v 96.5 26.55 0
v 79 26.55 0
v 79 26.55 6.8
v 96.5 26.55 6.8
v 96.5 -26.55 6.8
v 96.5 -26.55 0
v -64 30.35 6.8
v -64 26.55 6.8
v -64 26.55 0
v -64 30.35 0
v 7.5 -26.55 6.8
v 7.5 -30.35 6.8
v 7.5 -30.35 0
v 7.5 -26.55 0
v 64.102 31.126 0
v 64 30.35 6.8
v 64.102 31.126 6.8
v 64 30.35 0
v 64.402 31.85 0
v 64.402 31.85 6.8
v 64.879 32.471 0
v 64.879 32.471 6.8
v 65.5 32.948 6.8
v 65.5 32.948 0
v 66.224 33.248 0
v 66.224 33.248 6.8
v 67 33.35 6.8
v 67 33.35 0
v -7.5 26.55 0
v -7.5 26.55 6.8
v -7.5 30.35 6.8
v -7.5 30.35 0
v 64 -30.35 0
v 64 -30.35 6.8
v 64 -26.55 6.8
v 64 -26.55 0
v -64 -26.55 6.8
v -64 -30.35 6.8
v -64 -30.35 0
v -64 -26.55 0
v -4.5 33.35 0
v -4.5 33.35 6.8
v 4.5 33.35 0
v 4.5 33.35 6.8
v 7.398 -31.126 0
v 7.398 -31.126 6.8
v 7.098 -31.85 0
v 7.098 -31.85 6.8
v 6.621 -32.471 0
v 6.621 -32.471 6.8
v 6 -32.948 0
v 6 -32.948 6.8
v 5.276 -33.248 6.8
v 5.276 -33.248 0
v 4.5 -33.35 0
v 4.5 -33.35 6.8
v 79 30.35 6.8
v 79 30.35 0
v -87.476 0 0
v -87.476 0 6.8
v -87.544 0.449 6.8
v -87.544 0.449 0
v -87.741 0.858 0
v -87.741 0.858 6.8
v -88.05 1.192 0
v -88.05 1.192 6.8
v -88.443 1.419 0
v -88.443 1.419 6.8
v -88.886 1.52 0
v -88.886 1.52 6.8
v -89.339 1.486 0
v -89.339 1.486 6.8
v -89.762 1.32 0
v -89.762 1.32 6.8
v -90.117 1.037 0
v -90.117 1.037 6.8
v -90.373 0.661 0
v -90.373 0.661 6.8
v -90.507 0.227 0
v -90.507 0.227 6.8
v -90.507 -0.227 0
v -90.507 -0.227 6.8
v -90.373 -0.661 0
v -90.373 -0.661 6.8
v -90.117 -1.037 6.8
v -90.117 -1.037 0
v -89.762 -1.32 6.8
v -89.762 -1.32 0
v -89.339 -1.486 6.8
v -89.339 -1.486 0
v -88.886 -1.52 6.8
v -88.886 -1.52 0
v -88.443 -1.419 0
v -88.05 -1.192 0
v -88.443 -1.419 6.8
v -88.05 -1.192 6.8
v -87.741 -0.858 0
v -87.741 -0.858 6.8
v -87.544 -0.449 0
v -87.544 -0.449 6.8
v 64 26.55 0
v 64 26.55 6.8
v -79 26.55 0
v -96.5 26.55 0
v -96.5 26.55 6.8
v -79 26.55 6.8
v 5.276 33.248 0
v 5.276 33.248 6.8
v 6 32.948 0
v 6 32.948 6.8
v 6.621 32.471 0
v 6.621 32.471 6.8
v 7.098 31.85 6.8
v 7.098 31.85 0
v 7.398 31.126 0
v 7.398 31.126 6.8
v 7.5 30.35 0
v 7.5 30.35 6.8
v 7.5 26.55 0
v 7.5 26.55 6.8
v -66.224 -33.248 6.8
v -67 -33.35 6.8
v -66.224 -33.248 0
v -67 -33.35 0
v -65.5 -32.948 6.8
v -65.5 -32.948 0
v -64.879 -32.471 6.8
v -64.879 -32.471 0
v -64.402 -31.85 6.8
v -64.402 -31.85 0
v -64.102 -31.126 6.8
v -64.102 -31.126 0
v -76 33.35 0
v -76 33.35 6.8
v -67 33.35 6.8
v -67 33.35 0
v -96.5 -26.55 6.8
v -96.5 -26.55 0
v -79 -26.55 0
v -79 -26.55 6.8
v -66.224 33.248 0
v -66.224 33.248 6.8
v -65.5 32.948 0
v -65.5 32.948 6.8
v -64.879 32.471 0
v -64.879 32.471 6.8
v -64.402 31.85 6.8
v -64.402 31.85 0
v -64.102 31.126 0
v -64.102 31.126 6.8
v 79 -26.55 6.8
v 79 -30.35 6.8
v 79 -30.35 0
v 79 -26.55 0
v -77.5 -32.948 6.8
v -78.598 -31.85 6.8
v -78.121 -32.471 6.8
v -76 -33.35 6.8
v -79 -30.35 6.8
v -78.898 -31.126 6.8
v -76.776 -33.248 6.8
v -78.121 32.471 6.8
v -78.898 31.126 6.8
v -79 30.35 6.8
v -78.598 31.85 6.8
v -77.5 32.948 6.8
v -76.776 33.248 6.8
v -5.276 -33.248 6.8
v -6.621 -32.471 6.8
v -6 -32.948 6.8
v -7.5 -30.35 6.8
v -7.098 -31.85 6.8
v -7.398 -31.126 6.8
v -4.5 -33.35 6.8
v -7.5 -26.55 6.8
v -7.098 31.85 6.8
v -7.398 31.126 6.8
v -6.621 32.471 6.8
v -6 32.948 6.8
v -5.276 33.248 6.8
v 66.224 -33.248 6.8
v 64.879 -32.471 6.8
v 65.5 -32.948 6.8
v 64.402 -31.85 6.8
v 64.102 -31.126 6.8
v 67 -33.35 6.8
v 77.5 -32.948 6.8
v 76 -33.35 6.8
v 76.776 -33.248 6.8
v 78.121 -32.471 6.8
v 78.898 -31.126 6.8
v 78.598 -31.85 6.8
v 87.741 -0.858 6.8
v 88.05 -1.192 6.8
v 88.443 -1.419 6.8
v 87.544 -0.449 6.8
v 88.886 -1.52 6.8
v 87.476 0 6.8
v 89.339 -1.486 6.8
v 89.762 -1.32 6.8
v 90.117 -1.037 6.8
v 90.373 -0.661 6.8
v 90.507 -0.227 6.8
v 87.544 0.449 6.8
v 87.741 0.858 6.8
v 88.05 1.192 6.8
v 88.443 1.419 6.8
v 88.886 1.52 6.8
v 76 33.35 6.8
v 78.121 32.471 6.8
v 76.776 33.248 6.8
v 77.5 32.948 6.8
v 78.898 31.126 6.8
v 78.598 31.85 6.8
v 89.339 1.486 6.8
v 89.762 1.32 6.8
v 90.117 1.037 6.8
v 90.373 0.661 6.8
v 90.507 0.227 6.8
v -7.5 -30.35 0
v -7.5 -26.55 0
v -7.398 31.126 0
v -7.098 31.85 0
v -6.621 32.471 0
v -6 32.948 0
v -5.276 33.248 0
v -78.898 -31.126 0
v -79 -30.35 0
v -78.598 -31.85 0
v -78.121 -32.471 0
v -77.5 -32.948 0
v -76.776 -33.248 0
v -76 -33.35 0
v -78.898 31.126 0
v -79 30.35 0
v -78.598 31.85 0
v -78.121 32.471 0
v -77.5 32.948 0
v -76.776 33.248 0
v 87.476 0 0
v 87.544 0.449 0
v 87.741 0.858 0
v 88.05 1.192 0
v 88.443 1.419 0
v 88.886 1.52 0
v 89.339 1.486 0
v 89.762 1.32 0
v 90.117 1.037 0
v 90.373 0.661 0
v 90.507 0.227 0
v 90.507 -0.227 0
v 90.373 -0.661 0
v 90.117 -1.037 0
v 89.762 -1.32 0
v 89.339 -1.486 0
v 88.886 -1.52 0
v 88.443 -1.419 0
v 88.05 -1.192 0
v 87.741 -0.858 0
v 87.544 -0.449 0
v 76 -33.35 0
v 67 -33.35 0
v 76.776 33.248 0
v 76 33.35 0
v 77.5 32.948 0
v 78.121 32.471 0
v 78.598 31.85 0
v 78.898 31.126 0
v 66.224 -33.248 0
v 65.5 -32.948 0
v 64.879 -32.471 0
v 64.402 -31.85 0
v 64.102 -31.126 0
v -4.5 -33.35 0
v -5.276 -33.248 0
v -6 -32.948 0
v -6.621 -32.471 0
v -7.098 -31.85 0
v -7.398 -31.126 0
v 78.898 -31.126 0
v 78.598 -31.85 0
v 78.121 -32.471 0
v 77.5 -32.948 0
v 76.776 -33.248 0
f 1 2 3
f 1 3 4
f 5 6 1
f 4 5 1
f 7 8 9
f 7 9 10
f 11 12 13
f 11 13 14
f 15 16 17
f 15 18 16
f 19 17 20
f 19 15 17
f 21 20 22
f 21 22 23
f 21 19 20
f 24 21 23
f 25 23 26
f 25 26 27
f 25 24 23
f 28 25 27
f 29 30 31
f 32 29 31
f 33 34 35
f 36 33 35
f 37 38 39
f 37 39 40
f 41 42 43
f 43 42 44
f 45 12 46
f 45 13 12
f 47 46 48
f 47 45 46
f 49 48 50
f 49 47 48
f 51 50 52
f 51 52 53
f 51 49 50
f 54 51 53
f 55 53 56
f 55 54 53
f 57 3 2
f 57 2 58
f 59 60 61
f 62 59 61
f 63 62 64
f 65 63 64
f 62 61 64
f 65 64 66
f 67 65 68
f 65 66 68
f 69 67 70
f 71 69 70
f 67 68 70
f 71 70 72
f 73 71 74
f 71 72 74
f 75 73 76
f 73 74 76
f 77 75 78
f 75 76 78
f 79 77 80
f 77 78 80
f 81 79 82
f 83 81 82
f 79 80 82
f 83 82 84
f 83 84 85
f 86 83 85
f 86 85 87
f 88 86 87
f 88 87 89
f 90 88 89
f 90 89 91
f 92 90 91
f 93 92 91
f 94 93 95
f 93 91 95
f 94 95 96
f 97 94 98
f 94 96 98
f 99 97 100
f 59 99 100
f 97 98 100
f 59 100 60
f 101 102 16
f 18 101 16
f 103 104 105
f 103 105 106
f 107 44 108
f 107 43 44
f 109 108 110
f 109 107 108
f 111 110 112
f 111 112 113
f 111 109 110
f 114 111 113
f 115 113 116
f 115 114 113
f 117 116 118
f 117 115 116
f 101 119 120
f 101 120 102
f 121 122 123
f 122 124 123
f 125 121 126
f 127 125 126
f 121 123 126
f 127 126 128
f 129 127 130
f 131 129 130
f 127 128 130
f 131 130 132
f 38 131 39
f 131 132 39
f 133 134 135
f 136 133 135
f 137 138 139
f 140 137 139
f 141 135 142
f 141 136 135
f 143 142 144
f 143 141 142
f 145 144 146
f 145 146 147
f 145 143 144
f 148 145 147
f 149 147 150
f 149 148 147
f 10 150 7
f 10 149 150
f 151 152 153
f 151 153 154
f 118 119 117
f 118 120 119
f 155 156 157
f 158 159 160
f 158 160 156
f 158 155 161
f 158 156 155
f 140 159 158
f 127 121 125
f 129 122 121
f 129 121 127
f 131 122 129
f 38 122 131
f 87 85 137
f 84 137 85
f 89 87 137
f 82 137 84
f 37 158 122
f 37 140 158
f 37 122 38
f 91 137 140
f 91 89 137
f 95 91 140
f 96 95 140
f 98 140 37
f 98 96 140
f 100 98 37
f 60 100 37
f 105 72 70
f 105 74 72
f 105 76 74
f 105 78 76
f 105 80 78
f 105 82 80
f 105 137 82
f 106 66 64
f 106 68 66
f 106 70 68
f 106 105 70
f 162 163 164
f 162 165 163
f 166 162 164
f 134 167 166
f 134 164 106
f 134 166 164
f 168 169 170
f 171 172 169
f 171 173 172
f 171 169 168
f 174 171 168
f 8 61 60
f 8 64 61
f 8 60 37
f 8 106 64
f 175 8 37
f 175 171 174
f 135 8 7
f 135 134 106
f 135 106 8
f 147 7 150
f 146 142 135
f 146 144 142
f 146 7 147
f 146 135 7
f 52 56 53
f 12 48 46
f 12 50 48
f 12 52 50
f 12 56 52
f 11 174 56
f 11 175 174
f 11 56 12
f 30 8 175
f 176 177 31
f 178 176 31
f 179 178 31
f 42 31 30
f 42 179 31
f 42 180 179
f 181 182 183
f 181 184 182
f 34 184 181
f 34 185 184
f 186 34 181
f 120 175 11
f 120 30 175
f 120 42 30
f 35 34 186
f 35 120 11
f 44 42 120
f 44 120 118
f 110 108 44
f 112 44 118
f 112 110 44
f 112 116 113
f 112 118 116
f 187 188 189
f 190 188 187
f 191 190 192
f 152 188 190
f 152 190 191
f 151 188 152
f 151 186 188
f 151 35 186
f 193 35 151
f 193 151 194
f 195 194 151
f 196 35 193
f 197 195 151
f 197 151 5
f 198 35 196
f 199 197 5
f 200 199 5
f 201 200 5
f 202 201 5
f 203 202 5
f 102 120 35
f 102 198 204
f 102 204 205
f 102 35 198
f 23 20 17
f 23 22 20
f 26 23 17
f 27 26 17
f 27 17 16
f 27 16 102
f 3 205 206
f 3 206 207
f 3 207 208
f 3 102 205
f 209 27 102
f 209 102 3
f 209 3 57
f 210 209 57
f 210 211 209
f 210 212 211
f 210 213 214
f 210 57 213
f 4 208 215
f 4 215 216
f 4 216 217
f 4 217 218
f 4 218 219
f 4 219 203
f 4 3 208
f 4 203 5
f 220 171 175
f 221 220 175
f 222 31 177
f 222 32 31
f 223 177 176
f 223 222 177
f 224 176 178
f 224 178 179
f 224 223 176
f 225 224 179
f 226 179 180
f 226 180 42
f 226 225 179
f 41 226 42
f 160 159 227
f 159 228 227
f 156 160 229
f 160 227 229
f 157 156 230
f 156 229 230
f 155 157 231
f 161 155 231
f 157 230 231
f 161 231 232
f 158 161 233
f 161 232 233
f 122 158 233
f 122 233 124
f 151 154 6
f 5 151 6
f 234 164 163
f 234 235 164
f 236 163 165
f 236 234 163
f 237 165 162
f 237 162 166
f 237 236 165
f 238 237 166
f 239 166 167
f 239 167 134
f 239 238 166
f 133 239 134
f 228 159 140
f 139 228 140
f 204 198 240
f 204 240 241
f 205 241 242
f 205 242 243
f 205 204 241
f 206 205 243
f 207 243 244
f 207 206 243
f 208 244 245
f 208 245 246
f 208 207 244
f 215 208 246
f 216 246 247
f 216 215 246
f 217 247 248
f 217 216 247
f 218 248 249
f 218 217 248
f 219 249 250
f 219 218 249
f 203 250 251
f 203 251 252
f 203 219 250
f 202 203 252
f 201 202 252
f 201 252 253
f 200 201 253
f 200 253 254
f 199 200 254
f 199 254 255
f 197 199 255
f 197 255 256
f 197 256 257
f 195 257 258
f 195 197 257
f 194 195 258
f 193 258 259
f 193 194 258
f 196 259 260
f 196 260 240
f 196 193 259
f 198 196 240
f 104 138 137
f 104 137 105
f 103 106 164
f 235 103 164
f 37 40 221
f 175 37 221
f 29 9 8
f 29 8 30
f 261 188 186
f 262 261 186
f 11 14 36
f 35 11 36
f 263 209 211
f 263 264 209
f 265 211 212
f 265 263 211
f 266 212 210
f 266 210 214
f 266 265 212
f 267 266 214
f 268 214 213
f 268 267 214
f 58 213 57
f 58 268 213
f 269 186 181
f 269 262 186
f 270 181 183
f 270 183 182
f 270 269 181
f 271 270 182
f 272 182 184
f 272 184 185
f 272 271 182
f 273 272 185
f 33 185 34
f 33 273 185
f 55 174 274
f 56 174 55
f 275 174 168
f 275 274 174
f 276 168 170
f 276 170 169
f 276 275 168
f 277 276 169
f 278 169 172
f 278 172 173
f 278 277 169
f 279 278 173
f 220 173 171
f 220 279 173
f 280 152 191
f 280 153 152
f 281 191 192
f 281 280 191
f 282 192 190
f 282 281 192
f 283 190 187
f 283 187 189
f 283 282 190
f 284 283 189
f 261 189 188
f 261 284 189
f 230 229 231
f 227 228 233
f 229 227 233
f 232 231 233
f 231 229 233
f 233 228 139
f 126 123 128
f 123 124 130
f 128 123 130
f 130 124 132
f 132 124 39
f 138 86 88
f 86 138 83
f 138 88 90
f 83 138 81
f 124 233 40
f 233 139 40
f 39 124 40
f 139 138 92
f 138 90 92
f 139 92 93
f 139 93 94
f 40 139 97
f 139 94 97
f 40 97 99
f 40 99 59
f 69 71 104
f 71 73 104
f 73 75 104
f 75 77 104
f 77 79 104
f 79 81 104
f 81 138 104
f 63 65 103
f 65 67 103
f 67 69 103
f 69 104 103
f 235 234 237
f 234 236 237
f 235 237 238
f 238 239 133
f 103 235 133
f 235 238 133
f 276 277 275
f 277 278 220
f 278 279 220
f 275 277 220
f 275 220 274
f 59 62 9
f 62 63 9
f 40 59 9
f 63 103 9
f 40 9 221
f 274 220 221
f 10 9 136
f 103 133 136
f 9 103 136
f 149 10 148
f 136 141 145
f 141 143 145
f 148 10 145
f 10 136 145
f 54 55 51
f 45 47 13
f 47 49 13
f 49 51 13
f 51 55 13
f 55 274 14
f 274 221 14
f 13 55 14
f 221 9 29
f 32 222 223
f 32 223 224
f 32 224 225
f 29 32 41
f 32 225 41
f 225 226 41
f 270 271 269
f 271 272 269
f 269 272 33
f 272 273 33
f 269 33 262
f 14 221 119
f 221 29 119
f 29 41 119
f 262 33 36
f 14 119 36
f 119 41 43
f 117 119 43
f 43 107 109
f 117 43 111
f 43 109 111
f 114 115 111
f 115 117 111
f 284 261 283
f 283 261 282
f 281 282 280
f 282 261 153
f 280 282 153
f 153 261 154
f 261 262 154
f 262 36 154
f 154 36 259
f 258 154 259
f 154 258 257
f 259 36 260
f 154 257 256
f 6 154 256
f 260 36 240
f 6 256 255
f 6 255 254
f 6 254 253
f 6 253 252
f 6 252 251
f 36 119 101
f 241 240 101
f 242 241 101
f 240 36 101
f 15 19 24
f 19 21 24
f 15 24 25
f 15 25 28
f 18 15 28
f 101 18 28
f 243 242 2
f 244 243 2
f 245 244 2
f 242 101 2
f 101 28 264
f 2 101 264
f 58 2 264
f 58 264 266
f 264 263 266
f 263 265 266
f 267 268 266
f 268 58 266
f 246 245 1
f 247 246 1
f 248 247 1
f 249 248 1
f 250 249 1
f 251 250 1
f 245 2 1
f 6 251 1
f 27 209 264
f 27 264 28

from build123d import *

# Parameters (mm, degrees)
SKETCH1_W            = 193
SKETCH1_H            = 53.1
BOSS_EXTRUDE1_DEPTH  = 6.8
SKETCH2_W            = 15
SKETCH2_H            = 6.8
BOSS_EXTRUDE2_DEPTH  = 6.8
SKETCH3_R            = 1.524
CUT_EXTRUDE1_DEPTH   = 6.8
FILLET1_R            = 3
FILLET1_OF_MIRROR1_R = 3


with BuildPart() as part:
    # Sketch1 → Boss-Extrude1 (new body)
    with BuildSketch(Plane.XY):
        Rectangle(SKETCH1_W, SKETCH1_H)
    extrude(amount=BOSS_EXTRUDE1_DEPTH)

    # Sketch2 → Boss-Extrude2 (add)
    with BuildSketch(Plane.XY.offset(6.8)):
        with Locations((0, 29.95)):
            Rectangle(SKETCH2_W, SKETCH2_H)
        with Locations((-71.5, 29.95)):
            Rectangle(SKETCH2_W, SKETCH2_H)
        with Locations((-71.5, -29.95)):
            Rectangle(SKETCH2_W, SKETCH2_H)
        with Locations((0, -29.95)):
            Rectangle(SKETCH2_W, SKETCH2_H)
    boss_extrude2 = extrude(amount=-BOSS_EXTRUDE2_DEPTH)

    # Sketch3 → Cut-Extrude1 (cut)
    with BuildSketch(Plane.XY.offset(6.8)):
        with Locations((-89, 0)):
            Circle(SKETCH3_R)
    cut_extrude1 = extrude(amount=-CUT_EXTRUDE1_DEPTH, mode=Mode.SUBTRACT)

    # Fillet1
    fillet1_edges = [part.edges().sort_by_distance(p)[0] for p in [
        (7.5, 33.35, 3.4),
        (-7.5, 33.35, 3.4),
        (-64, 33.35, 3.4),
        (-79, 33.35, 3.4),
        (7.5, -33.35, 3.4),
        (-7.5, -33.35, 3.4),
        (-64, -33.35, 3.4),
        (-79, -33.35, 3.4),
    ]]
    fillet(fillet1_edges, radius=FILLET1_R)

    # Mirror1: Boss-Extrude2, Cut-Extrude1 across plane
    add(boss_extrude2.mirror(Plane(origin=(0, 0, 0), x_dir=(0, 0, 1), z_dir=(1, 0, 0))))
    add(cut_extrude1.mirror(Plane(origin=(0, 0, 0), x_dir=(0, 0, 1), z_dir=(1, 0, 0))), mode=Mode.SUBTRACT)

    # Fillet1 of Mirror1
    fillet1_of_mirror1_edges = [part.edges().sort_by_distance(p)[0] for p in [
        (-7.5, 33.35, 3.4),
        (7.5, 33.35, 3.4),
        (64, 33.35, 3.4),
        (79, 33.35, 3.4),
        (-7.5, -33.35, 3.4),
        (7.5, -33.35, 3.4),
        (64, -33.35, 3.4),
        (79, -33.35, 3.4),
    ]]
    fillet(fillet1_of_mirror1_edges, radius=FILLET1_OF_MIRROR1_R)


solid = part.part
